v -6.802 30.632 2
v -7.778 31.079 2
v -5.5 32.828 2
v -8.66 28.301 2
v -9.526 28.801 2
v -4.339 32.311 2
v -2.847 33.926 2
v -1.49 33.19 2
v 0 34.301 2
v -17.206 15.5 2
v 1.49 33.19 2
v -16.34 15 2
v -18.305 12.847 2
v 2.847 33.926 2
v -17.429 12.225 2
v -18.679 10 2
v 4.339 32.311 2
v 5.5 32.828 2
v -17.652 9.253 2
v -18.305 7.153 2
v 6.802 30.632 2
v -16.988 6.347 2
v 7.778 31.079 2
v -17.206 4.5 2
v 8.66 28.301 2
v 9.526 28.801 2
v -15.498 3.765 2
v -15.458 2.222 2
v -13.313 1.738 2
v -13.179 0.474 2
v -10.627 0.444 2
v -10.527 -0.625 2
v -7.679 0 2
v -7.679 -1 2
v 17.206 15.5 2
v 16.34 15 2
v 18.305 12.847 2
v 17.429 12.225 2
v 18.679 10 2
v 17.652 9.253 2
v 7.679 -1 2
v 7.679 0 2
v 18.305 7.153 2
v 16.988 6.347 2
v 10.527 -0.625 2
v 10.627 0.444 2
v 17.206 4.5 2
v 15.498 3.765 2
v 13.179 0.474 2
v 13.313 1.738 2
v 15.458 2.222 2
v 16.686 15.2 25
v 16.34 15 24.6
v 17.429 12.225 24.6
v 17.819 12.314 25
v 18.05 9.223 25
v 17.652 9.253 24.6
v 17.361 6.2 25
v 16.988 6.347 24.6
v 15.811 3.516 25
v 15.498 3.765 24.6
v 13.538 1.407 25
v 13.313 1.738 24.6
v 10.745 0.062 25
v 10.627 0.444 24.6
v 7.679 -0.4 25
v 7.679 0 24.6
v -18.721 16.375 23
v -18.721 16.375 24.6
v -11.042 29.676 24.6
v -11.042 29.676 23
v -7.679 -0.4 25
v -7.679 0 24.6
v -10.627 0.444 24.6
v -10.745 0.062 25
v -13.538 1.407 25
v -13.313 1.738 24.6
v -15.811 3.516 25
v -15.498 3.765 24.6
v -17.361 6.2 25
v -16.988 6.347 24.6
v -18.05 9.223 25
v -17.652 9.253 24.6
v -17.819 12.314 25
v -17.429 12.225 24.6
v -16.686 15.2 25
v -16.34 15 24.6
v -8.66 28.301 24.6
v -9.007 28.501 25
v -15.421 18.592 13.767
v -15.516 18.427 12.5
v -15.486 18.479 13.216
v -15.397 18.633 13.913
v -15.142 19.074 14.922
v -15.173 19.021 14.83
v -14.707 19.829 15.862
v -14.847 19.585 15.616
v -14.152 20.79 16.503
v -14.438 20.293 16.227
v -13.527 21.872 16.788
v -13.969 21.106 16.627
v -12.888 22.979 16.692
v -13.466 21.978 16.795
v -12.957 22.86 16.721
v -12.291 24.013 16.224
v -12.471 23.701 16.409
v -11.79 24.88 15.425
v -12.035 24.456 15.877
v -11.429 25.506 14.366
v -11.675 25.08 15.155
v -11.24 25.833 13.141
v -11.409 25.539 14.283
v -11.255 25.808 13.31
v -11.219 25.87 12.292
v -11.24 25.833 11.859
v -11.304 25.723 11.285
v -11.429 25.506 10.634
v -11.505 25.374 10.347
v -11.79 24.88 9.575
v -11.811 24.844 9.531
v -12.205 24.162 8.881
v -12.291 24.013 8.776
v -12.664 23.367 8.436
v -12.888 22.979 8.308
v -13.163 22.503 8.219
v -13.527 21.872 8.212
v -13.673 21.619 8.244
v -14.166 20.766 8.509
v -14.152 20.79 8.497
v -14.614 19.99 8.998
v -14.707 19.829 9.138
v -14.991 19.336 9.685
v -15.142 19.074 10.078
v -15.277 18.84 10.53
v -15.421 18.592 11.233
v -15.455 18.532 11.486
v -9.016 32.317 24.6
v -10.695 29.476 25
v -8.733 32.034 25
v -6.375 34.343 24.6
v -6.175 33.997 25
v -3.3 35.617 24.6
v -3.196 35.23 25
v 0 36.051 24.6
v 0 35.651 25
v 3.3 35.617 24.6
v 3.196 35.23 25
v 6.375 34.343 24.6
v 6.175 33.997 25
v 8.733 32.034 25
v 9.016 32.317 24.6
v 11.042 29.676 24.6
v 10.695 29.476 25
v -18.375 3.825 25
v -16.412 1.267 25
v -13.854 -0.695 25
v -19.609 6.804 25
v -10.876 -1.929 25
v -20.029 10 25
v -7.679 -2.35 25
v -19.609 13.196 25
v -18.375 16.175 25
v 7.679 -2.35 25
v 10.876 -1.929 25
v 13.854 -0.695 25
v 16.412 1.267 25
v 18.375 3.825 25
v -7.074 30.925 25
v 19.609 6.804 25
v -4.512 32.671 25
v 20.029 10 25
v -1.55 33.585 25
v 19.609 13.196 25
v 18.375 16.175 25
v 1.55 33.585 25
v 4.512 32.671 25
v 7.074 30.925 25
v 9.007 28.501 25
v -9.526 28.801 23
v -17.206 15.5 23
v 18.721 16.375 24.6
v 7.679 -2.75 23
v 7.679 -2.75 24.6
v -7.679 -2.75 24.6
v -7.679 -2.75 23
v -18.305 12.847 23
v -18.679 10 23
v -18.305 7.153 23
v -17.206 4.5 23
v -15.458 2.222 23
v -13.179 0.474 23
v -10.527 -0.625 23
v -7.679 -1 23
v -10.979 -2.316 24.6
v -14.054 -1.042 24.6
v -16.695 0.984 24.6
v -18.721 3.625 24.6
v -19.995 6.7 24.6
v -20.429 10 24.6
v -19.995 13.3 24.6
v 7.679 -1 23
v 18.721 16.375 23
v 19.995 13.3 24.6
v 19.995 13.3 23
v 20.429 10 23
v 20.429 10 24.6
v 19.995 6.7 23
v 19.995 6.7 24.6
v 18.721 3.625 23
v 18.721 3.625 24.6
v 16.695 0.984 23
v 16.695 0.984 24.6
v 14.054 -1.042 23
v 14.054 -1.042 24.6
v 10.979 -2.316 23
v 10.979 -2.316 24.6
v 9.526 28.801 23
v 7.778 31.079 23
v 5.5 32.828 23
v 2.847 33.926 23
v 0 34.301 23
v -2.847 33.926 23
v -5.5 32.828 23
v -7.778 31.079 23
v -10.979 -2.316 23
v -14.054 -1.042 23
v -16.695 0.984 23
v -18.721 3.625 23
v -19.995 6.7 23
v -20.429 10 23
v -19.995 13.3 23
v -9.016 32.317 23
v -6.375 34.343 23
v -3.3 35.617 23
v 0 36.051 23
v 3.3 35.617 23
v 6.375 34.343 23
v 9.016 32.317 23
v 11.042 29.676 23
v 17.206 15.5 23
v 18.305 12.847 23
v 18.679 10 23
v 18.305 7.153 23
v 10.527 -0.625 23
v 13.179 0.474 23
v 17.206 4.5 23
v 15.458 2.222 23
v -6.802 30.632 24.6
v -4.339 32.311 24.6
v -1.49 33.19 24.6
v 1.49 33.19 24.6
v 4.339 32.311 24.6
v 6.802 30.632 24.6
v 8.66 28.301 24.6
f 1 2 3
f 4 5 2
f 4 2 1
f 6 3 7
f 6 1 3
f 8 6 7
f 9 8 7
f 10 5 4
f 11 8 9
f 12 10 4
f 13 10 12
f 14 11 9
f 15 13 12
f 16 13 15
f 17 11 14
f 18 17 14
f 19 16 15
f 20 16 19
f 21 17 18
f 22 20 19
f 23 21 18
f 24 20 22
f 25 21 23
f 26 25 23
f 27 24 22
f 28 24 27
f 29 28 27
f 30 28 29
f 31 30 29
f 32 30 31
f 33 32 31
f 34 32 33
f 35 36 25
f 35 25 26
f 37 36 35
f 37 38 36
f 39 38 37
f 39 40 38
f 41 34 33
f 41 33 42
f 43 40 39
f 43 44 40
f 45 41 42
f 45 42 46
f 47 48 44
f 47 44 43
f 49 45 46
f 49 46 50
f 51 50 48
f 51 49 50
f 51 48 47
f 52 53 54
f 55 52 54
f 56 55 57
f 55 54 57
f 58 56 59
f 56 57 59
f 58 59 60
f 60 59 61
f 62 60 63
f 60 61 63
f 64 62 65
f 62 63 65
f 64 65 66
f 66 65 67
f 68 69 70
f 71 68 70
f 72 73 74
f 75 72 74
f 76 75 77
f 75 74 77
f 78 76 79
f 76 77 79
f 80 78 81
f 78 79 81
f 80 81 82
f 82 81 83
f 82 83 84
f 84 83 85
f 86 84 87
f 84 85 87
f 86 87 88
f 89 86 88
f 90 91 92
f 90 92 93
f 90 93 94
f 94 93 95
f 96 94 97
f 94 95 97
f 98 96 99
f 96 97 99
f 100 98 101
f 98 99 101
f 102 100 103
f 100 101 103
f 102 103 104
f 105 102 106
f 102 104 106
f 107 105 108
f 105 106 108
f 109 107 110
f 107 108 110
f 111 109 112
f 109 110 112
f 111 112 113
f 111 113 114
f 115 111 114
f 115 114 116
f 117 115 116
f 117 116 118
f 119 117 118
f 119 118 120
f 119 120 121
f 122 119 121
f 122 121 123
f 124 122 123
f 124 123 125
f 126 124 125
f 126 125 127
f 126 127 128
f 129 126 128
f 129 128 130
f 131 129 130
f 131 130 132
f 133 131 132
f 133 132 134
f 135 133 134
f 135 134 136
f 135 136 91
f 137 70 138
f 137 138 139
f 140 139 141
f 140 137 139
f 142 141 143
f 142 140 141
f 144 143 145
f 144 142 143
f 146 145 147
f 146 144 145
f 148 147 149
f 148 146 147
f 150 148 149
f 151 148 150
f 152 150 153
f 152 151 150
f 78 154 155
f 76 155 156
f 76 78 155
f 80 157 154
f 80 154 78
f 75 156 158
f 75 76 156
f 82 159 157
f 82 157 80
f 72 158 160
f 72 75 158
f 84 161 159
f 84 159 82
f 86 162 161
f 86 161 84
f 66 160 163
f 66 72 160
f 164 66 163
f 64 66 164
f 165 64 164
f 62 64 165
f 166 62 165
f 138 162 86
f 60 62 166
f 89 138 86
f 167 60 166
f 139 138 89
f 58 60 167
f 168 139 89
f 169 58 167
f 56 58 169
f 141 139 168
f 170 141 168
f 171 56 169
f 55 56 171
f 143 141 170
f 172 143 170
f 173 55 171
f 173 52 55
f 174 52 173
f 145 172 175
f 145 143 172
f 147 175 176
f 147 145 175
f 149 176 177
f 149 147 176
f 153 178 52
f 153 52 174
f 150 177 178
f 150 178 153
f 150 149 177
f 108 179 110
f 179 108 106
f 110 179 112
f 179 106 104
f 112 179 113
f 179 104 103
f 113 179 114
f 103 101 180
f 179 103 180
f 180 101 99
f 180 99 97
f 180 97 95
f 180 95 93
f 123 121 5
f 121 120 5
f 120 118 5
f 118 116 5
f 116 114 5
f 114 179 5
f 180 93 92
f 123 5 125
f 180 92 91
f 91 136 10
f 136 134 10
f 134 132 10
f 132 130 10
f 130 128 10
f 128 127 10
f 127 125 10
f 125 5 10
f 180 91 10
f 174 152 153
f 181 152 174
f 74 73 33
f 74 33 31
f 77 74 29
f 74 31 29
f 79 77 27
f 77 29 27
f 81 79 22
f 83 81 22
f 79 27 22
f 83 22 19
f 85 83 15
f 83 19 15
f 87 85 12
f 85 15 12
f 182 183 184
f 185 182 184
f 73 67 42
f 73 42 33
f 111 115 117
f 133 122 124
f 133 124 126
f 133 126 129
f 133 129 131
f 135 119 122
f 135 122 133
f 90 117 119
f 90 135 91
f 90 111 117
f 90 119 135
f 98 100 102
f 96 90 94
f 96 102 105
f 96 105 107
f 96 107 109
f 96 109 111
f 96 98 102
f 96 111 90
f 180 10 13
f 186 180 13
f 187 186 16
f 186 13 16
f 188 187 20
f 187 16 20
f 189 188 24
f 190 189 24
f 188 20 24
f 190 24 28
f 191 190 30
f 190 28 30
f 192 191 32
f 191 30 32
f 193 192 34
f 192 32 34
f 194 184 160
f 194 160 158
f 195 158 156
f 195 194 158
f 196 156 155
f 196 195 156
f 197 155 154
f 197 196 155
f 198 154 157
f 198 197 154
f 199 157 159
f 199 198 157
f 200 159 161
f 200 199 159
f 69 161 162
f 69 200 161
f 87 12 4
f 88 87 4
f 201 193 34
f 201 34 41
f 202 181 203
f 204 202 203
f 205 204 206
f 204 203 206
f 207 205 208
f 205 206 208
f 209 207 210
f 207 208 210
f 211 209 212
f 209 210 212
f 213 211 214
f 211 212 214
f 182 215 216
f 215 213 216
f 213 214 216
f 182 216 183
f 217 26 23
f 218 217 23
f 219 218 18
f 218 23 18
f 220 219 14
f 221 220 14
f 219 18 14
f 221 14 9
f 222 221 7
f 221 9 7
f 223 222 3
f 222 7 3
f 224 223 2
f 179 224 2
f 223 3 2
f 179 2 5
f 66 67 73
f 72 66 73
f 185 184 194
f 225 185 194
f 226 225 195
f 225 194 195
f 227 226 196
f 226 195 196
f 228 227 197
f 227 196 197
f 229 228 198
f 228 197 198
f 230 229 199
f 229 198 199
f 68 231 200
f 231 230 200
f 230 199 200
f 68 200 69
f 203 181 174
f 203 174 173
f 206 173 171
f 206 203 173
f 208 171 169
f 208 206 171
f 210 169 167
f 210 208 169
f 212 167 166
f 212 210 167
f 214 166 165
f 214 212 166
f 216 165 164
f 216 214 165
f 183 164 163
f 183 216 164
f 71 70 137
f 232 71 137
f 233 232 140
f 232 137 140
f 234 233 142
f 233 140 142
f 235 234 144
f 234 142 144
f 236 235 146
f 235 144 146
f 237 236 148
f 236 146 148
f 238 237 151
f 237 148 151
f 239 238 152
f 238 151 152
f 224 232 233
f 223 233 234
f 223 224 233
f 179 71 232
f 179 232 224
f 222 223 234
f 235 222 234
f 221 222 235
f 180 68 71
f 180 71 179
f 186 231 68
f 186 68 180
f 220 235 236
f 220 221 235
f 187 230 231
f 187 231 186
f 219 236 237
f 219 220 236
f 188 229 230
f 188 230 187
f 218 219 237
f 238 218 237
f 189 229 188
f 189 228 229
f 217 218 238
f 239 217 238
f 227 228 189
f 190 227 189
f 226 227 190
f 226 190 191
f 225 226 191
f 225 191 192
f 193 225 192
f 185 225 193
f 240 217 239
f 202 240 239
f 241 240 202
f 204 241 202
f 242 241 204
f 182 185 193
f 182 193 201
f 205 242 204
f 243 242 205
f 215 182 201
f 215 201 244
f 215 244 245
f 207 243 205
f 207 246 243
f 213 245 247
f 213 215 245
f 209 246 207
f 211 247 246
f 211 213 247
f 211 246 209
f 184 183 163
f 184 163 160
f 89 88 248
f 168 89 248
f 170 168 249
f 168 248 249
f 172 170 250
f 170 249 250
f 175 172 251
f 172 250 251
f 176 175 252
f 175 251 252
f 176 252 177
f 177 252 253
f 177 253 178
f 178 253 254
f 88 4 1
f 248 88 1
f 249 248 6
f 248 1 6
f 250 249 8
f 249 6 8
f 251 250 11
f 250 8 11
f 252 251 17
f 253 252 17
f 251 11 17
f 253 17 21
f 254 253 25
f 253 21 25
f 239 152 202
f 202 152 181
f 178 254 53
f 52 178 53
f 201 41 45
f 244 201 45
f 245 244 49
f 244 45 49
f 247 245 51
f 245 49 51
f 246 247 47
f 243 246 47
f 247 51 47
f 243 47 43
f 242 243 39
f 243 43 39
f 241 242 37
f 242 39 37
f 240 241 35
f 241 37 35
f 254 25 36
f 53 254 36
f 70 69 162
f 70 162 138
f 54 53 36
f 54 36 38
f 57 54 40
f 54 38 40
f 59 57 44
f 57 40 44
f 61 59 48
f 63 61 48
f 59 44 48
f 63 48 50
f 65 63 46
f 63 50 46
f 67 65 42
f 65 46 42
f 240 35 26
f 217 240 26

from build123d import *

# Parameters (mm, degrees)
F1_DEPTH      = 25
F2_R          = 4.3
F3_DEPTH      = 3
F3_DEPTH_BACK = 0.65
F5_R          = 40.103887
F6_DEPTH      = 2
F7_R          = 28.872497
F8_DEPTH      = 21
F9_R          = 30.144829
F10_DEPTH     = 25
F11_SIZE      = 0.4


with BuildPart() as f1:
    # F0 (on Top) → F1 (new body)
    with BuildSketch(Plane.XY):
        with BuildLine():
            ThreePointArc((7.679492, -4), (19.803848, 3), (19.803848, 17))
            Line((19.803848, 17), (12.124356, 30.30127))
            ThreePointArc((12.124356, 30.30127), (0, 37.30127), (-12.124356, 30.30127))
            Line((-12.124356, 30.30127), (-19.803848, 17))
            ThreePointArc((-19.803848, 17), (-19.803848, 3), (-7.679492, -4))
            Line((-7.679492, -4), (0, -4))
            Line((0, -4), (7.679492, -4))
        make_face()
        with BuildLine():
            Line((7.679492, 0), (0, 0))
            Line((0, 0), (-7.679492, 0))
            ThreePointArc((-7.679492, 0), (-16.339746, 5), (-16.339746, 15))
            Line((-16.339746, 15), (-8.660254, 28.30127))
            ThreePointArc((-8.660254, 28.30127), (0, 33.30127), (8.660254, 28.30127))
            Line((8.660254, 28.30127), (16.339746, 15))
            ThreePointArc((16.339746, 15), (16.339746, 5), (7.679492, 0))
        make_face(mode=Mode.SUBTRACT)
    extrude(amount=F1_DEPTH)

    # F2 (on face) → F3 (cut, two sides)
    with BuildSketch(Plane(origin=(-22.214102, 12.825318, 0), x_dir=(-0.5, -0.866025, 0), z_dir=(-0.866025, 0.5, 0))) as f3_sk:
        with Locations((-12.5, 12.5)):
            Circle(F2_R)
    extrude(amount=-F3_DEPTH, mode=Mode.SUBTRACT)
    extrude(f3_sk.sketch, amount=-F3_DEPTH_BACK, mode=Mode.SUBTRACT)

    # F5 (on face) → F6 (cut)
    with BuildSketch(Plane(origin=(0, 0, 0), x_dir=(1, 0, 0), z_dir=(0, 0, -1))):
        with Locations((0, -16.662003)):
            Circle(F5_R)
    extrude(amount=-F6_DEPTH, mode=Mode.SUBTRACT)

    # F7 (on face) → F8 (cut)
    with BuildSketch(Plane(origin=(0, 0, 2), x_dir=(1, 0, 0), z_dir=(0, 0, -1))):
        with Locations((0, -15.382648)):
            Circle(F7_R)
        with BuildLine():
            Line((-9.526279, -28.80127), (-17.205771, -15.5))
            ThreePointArc((-17.205771, -15.5), (-17.205771, -4.5), (-7.679492, 1))
            Line((-7.679492, 1), (7.679492, 1))
            ThreePointArc((7.679492, 1), (17.205771, -4.5), (17.205771, -15.5))
            Line((17.205771, -15.5), (9.526279, -28.80127))
            ThreePointArc((9.526279, -28.80127), (0, -34.30127), (-9.526279, -28.80127))
        make_face(mode=Mode.SUBTRACT)
    extrude(amount=-F8_DEPTH, mode=Mode.SUBTRACT)

    # F9 (on face) → F10 (cut)
    with BuildSketch(Plane.XY.offset(25)):
        with Locations((-0.752793, 11.019209)):
            Circle(F9_R)
        with BuildLine():
            ThreePointArc((-7.679492, -2.75), (-18.721316, 3.625), (-18.721316, 16.375))
            Line((-18.721316, 16.375), (-11.041824, 29.67627))
            ThreePointArc((-11.041824, 29.67627), (0, 36.05127), (11.041824, 29.67627))
            Line((11.041824, 29.67627), (18.721316, 16.375))
            ThreePointArc((18.721316, 16.375), (18.721316, 3.625), (7.679492, -2.75))
            Line((7.679492, -2.75), (-7.679492, -2.75))
        make_face(mode=Mode.SUBTRACT)
    extrude(amount=-F10_DEPTH, mode=Mode.SUBTRACT)

    # F11
    f11_edges = [f1.edges().sort_by_distance(p)[0] for p in [
        (-14.88157, 23.025635, 25),
        (-12.5, 21.650635, 25),
    ]]
    chamfer(f11_edges, length=F11_SIZE)


solid = f1.part
